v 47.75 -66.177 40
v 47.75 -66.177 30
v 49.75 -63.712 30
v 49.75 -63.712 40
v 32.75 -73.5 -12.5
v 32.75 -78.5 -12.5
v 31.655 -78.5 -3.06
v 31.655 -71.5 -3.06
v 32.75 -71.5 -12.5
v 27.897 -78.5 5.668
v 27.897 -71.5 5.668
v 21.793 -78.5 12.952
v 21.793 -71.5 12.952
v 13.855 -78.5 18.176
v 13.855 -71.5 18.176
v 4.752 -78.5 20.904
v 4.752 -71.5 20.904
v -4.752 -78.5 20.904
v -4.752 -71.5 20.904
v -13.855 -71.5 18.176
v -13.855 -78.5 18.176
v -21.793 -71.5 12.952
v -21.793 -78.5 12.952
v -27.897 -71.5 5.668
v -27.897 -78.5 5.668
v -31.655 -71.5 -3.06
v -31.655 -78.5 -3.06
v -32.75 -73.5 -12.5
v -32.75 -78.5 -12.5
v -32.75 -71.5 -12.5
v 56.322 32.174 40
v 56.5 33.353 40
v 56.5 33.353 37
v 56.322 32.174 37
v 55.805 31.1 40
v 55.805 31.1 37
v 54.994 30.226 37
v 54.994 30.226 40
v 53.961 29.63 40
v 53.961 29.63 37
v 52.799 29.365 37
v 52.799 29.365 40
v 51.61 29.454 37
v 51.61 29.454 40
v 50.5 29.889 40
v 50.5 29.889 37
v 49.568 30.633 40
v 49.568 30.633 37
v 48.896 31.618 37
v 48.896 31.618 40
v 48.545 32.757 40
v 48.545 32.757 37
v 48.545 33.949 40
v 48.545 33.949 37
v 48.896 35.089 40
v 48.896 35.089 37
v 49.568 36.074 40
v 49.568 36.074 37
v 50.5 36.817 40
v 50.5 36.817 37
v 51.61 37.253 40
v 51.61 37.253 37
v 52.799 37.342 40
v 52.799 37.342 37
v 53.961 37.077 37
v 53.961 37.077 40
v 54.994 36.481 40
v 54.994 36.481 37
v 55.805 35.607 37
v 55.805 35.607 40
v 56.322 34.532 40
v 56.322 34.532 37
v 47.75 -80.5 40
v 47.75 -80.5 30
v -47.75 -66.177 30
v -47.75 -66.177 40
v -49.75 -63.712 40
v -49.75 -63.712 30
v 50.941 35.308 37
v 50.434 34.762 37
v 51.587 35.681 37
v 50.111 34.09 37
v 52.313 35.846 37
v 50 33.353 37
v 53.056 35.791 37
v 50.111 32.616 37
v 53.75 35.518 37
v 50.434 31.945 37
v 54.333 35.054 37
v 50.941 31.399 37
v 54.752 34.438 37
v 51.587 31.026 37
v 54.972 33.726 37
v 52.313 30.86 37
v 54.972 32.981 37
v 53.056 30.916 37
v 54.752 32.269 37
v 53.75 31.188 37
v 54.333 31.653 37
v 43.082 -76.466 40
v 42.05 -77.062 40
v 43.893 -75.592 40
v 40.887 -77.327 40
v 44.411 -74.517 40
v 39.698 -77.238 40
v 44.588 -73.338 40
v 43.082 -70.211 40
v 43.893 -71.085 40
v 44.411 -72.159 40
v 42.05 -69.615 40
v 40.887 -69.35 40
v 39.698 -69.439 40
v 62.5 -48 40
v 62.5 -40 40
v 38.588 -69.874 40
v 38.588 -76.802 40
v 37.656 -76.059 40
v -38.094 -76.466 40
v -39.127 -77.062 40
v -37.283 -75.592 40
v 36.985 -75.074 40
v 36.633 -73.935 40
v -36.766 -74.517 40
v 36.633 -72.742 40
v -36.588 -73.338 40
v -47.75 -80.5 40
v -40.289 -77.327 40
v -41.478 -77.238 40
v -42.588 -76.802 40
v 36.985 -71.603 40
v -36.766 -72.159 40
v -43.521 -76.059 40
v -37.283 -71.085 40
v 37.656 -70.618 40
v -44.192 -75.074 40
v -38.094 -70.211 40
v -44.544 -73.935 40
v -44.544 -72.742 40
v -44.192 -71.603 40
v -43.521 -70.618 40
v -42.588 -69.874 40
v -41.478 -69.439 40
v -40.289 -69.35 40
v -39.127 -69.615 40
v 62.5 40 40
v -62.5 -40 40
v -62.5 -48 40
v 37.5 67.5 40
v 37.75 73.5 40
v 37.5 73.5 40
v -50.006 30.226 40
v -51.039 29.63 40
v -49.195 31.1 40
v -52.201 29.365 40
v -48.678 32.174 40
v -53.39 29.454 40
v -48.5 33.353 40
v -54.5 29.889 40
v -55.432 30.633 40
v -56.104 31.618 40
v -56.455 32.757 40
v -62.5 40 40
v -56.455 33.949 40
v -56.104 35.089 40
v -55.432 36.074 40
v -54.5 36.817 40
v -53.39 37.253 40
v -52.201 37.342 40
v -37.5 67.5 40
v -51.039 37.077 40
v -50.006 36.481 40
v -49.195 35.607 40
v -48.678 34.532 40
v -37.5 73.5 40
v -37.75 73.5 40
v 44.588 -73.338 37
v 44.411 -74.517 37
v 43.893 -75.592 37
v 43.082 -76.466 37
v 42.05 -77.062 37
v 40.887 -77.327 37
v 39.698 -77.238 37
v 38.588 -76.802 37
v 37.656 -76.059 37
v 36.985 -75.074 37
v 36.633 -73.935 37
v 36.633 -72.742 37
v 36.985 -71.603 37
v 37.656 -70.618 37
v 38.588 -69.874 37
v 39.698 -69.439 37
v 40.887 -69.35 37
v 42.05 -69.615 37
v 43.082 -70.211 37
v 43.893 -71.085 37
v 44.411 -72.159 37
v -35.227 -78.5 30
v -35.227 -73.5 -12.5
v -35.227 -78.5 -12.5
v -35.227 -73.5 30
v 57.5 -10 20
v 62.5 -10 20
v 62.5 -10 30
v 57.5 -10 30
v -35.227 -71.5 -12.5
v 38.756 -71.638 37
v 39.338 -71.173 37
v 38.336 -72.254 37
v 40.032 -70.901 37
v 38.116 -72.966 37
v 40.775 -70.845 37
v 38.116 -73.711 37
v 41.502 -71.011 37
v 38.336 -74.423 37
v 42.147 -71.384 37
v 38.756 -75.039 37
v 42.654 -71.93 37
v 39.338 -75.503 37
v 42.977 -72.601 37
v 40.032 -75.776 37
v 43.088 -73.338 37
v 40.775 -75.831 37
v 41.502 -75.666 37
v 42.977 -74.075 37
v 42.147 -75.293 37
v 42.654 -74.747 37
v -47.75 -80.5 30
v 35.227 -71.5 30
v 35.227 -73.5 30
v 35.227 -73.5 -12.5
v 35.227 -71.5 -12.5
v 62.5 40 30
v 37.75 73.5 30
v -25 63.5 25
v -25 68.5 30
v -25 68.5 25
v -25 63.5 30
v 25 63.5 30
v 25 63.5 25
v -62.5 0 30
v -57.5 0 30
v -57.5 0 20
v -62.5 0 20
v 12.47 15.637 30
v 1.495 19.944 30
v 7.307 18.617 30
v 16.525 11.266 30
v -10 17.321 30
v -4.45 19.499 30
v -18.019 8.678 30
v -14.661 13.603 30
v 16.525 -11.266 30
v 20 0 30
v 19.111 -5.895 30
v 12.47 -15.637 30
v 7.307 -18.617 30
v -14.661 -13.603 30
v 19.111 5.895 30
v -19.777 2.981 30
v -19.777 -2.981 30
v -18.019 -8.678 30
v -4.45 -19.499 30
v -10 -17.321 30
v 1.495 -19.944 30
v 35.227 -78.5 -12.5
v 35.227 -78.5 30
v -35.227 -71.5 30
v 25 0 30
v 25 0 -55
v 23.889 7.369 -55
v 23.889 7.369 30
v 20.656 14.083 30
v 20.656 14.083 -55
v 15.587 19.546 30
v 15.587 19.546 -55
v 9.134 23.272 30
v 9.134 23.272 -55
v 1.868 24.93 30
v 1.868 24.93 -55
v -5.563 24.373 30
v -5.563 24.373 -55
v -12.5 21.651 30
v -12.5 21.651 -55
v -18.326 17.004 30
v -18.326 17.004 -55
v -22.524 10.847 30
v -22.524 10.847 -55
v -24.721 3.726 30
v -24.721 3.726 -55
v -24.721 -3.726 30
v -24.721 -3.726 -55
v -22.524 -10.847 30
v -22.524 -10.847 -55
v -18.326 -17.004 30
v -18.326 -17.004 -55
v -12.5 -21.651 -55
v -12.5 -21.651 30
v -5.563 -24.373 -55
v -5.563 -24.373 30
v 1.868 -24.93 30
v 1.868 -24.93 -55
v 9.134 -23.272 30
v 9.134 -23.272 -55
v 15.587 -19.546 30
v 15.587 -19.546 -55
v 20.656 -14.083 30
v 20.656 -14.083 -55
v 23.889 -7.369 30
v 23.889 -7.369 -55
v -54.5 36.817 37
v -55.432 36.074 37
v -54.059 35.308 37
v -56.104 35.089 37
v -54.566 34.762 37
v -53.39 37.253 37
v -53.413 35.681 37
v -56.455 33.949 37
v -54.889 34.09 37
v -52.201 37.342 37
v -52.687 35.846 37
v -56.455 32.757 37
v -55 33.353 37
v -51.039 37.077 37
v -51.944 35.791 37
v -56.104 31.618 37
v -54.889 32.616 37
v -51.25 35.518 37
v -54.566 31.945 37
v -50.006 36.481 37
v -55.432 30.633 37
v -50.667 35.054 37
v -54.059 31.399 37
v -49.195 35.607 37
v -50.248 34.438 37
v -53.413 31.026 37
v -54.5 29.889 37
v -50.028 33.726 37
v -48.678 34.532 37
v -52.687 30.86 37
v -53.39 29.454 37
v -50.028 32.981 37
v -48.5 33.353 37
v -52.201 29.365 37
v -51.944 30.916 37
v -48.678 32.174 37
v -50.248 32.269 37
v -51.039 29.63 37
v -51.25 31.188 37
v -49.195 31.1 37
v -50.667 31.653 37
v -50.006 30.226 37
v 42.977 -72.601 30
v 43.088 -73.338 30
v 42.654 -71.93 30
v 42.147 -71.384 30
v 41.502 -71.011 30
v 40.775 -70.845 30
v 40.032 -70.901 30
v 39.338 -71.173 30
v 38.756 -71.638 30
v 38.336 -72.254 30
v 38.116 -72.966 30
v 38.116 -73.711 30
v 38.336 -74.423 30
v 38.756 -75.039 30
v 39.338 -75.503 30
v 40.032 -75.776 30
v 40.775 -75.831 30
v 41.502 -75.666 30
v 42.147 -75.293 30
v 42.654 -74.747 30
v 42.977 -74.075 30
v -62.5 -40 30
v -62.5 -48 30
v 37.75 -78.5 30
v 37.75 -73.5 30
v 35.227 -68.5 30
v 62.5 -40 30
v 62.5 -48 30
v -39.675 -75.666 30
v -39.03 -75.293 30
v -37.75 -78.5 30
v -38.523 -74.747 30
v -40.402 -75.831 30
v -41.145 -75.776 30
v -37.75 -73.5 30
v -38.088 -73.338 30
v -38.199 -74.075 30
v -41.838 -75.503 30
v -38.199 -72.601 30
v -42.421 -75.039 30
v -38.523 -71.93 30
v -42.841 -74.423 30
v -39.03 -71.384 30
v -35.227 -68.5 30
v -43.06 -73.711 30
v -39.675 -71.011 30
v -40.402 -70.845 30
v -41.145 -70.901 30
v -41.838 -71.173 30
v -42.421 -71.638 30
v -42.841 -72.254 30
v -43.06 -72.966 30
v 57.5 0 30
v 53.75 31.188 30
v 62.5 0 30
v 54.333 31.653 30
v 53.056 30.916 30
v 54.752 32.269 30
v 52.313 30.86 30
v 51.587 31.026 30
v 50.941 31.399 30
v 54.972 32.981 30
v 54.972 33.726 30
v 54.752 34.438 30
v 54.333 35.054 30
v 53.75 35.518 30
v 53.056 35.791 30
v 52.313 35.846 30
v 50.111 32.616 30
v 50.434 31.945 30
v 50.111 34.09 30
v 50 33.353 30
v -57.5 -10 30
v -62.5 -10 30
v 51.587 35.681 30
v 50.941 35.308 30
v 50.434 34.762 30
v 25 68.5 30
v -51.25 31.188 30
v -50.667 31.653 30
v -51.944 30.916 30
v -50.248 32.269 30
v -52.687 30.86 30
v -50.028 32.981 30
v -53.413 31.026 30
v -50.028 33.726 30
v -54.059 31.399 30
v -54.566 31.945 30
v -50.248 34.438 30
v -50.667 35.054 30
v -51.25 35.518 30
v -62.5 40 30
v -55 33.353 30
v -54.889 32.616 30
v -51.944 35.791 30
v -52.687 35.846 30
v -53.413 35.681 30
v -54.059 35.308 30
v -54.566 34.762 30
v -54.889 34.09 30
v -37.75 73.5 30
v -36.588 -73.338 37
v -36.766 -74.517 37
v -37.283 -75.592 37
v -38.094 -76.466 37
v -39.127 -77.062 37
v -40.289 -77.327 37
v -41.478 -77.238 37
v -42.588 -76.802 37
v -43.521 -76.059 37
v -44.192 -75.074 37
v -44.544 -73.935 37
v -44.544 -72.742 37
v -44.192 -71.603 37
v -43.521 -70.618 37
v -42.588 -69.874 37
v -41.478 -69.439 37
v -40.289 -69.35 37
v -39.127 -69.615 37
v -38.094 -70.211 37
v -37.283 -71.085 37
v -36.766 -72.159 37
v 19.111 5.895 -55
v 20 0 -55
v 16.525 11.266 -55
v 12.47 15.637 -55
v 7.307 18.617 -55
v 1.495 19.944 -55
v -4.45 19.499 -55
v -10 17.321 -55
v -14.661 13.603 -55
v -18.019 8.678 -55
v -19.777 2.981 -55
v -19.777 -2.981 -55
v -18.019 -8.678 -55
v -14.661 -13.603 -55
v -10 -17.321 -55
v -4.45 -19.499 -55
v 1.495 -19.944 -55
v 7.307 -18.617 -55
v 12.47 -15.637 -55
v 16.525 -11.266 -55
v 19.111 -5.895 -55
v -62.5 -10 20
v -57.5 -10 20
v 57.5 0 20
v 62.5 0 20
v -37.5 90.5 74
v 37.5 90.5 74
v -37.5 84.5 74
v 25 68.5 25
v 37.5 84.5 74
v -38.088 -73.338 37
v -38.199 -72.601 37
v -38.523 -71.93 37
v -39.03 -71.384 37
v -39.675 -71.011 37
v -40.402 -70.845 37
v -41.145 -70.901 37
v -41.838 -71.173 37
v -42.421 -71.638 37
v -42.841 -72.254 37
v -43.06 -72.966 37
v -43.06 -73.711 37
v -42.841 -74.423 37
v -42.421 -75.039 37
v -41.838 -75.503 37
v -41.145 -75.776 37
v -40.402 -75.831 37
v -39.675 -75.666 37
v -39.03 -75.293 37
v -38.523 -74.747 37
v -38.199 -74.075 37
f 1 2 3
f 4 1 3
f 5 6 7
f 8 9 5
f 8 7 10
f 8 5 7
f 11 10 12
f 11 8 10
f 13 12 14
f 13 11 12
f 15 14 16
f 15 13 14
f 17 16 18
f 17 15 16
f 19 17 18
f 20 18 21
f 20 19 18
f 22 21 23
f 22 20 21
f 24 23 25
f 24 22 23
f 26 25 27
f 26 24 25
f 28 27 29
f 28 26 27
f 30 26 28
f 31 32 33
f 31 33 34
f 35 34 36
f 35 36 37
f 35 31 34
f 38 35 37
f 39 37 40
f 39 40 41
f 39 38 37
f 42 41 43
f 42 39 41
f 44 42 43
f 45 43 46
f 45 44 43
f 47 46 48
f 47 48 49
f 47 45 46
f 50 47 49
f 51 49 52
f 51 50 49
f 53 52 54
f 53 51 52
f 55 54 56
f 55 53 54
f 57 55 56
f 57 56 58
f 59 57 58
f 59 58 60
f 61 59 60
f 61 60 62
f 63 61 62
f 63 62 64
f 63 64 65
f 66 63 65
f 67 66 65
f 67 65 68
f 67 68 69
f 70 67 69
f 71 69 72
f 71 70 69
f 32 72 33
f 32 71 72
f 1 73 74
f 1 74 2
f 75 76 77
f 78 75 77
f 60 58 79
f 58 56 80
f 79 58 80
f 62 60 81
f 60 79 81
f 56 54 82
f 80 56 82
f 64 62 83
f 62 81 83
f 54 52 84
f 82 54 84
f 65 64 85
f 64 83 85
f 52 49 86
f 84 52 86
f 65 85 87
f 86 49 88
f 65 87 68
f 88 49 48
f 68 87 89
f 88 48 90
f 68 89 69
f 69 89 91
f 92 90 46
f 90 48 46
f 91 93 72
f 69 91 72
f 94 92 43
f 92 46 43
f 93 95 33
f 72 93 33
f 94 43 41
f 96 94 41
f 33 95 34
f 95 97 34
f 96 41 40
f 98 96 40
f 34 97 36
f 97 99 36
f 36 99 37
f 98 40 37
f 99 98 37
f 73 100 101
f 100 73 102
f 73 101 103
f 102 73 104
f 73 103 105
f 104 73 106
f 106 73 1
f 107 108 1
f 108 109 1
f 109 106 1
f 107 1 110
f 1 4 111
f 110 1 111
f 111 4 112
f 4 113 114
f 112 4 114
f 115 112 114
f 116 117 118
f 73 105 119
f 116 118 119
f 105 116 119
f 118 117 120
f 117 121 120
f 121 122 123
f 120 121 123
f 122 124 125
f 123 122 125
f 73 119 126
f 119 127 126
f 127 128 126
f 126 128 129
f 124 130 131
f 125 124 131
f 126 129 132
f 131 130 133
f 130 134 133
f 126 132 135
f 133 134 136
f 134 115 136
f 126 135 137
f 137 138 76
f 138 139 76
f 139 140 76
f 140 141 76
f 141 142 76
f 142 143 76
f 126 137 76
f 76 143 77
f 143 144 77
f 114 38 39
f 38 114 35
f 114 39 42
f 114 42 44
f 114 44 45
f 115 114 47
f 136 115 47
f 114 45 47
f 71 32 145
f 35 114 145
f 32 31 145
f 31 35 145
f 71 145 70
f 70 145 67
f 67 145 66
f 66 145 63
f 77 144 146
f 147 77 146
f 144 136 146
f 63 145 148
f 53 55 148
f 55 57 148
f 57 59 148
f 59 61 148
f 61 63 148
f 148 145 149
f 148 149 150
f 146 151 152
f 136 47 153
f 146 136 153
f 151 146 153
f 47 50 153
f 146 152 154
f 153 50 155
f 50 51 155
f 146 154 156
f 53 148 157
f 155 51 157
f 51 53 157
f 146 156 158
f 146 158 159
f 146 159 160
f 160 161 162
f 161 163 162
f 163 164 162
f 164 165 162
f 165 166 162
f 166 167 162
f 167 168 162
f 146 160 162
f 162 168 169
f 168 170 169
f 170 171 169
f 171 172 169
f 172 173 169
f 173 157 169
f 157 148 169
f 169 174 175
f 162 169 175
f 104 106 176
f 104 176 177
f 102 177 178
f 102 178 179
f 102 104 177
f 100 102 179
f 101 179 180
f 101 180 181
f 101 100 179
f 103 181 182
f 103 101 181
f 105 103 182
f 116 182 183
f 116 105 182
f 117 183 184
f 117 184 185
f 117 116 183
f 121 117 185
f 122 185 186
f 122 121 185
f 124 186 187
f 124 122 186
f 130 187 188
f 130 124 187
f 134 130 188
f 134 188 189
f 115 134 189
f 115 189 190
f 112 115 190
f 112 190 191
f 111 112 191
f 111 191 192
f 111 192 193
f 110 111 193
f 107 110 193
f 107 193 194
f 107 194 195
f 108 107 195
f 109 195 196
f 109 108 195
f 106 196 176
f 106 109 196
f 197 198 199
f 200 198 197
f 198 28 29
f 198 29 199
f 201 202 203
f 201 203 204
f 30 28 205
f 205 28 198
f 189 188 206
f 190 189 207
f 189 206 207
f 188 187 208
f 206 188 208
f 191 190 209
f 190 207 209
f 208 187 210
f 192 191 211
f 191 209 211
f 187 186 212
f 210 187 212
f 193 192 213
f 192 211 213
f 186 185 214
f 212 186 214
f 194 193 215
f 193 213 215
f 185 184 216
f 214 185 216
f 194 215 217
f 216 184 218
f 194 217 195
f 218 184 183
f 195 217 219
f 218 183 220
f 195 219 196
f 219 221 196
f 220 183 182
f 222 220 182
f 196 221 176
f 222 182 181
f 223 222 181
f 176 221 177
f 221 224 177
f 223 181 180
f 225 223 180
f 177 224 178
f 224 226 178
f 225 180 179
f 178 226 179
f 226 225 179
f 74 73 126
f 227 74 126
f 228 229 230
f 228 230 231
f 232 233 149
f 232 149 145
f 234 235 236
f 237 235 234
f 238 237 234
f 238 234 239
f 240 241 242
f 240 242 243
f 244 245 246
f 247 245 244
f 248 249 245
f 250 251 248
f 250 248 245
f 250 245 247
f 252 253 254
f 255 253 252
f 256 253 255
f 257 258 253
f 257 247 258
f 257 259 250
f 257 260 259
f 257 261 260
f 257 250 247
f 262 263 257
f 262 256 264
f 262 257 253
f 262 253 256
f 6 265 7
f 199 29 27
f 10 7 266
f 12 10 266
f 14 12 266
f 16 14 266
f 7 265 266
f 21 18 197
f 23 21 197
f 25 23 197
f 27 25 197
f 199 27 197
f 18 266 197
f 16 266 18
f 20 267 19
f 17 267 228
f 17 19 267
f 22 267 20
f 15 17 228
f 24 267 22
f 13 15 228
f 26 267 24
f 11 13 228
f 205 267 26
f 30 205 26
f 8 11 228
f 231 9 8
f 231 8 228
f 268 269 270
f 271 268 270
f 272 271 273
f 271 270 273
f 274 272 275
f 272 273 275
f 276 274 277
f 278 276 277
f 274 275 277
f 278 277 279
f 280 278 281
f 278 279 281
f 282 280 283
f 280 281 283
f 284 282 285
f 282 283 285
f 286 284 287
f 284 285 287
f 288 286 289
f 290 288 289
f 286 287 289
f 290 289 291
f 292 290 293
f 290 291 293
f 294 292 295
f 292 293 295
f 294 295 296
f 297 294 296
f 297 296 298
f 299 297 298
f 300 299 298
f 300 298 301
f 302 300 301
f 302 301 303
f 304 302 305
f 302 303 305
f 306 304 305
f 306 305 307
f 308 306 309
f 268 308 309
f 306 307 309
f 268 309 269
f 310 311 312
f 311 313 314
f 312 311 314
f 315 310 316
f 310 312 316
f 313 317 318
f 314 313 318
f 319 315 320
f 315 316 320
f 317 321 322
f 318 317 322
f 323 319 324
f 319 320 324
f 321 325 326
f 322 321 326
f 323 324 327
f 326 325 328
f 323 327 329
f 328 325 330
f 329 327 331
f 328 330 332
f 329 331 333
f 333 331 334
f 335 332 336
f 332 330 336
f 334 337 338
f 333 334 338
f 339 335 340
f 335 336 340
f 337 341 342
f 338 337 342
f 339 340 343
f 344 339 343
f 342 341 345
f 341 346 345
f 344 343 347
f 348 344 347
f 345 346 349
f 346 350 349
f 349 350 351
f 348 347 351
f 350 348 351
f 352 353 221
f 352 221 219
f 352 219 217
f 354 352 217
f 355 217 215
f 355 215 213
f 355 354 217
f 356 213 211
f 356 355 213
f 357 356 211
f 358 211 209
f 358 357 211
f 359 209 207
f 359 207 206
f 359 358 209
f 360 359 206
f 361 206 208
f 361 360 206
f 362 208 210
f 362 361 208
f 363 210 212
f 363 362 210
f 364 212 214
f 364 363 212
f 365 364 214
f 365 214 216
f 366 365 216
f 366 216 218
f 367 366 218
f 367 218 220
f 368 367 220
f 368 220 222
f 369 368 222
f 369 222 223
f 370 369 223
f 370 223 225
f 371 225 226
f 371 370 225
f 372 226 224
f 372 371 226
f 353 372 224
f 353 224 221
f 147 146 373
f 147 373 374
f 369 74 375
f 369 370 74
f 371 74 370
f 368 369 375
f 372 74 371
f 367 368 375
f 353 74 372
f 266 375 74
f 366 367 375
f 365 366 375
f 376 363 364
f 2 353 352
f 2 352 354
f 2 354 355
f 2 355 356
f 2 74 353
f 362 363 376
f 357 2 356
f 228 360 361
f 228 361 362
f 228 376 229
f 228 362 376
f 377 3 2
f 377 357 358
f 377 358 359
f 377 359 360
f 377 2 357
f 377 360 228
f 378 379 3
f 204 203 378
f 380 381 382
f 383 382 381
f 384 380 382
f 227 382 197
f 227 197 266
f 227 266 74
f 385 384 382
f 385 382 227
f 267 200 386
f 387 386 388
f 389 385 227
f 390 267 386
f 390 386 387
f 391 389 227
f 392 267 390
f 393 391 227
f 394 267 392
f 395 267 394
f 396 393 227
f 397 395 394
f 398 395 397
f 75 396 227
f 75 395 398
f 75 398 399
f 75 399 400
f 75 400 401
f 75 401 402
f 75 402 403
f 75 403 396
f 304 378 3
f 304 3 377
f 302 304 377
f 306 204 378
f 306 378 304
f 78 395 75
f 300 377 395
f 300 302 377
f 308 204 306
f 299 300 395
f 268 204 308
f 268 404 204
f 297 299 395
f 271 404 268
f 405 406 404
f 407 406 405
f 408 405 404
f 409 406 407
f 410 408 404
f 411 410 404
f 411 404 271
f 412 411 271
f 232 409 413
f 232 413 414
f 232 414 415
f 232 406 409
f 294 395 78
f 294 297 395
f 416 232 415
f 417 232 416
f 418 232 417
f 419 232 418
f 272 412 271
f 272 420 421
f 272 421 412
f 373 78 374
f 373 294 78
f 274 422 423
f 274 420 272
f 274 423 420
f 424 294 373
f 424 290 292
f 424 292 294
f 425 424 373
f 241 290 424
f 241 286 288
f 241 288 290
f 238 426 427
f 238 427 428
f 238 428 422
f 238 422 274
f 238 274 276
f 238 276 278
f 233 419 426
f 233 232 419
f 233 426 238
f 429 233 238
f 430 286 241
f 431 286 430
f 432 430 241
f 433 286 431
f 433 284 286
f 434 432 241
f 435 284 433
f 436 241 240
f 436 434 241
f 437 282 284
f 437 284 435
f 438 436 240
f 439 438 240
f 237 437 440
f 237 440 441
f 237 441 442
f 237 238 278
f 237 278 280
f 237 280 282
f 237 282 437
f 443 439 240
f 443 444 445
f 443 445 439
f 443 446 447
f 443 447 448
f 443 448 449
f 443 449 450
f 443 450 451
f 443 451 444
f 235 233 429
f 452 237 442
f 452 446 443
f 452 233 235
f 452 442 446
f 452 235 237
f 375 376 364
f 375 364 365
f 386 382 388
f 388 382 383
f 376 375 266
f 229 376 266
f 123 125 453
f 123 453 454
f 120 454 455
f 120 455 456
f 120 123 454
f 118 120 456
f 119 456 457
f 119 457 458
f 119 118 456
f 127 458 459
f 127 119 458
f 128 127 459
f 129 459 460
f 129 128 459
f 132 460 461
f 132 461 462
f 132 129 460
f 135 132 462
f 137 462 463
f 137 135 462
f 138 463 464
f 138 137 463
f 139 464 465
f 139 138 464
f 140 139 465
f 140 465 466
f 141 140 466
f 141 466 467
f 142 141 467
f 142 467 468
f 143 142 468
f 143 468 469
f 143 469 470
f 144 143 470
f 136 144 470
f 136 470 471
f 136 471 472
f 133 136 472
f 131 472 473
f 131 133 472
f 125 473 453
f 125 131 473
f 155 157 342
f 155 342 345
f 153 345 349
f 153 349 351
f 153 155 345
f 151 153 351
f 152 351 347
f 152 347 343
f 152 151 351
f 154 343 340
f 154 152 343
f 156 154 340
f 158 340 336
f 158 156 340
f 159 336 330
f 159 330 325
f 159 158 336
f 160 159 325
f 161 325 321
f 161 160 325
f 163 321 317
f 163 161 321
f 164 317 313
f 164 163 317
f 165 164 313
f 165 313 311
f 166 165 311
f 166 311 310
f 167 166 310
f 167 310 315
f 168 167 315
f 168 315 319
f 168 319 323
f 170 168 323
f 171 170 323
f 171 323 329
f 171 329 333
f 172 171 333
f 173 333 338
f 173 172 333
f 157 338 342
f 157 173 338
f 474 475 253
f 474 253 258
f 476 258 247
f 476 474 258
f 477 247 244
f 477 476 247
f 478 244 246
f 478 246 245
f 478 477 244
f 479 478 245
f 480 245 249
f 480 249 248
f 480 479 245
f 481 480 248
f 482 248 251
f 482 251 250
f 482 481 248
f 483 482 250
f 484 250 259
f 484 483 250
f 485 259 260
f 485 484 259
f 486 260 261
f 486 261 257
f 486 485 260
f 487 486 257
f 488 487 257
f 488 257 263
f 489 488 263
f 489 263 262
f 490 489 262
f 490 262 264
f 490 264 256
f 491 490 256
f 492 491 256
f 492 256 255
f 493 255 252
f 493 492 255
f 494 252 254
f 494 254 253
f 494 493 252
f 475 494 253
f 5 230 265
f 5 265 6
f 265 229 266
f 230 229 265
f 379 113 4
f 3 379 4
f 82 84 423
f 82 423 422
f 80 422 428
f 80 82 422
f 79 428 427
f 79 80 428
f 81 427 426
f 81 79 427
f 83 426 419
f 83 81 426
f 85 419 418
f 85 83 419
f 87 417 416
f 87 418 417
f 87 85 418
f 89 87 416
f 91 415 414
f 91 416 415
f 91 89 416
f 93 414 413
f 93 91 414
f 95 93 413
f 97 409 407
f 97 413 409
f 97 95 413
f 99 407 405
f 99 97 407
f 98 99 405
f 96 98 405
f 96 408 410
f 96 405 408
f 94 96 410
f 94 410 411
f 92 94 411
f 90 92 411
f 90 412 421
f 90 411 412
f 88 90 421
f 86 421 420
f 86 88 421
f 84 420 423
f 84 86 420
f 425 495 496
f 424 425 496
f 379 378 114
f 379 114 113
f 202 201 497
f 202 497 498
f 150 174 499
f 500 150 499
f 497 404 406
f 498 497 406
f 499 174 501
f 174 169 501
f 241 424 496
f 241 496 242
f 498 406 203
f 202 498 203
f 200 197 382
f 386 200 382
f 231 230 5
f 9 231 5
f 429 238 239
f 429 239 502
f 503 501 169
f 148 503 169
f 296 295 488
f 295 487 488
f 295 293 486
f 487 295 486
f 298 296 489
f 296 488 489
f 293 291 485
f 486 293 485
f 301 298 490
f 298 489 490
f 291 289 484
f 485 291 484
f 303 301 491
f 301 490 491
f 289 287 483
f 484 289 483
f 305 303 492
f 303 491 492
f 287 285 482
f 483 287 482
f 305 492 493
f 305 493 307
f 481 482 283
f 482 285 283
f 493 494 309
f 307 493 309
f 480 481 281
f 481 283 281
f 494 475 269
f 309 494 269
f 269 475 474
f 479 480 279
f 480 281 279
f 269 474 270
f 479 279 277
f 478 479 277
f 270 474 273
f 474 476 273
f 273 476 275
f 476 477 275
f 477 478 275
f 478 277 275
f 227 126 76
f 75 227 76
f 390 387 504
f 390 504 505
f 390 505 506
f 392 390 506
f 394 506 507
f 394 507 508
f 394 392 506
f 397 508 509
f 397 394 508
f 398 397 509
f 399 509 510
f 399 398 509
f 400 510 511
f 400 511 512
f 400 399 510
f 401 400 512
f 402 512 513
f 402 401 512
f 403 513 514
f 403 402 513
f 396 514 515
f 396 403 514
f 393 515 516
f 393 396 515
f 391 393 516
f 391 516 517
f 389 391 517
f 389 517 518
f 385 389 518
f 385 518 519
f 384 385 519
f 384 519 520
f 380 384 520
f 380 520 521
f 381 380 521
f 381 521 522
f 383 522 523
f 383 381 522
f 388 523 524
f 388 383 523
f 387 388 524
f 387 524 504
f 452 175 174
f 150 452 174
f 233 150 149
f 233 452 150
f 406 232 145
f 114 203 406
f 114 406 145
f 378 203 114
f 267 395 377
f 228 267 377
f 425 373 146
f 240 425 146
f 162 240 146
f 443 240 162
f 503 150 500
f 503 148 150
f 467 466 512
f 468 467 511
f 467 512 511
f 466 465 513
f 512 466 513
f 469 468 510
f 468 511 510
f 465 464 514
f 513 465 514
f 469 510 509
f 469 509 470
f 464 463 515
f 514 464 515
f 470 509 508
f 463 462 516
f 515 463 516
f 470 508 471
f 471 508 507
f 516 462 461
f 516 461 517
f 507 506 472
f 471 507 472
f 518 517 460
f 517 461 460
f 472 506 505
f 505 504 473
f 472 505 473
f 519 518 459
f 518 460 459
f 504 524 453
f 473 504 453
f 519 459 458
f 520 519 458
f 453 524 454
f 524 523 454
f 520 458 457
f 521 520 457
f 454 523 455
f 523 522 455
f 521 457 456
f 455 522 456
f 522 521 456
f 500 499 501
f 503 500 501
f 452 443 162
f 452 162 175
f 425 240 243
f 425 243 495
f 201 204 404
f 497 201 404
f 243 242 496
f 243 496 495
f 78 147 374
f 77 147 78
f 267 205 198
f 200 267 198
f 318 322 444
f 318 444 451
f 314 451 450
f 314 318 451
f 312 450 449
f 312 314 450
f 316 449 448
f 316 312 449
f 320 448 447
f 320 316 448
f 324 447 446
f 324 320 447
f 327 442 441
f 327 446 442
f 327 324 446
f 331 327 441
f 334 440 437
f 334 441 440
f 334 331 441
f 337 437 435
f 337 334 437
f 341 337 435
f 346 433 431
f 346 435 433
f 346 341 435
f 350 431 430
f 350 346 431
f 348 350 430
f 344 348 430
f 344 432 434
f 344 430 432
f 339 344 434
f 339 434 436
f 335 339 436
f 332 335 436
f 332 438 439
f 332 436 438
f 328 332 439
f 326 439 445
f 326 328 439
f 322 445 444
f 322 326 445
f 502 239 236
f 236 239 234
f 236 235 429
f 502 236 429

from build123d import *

# Parameters (mm, degrees)
ESTRUSIONE_ESTRUSIONE1_DEPTH       = 30
ESTRUSIONE_ESTRUSIONE1_DEPTH_BACK  = 55
SCHIZZO1_R                         = 25
SCHIZZO1_R_2                       = 20
ESTRUSIONE_ESTRUSIONE2_DEPTH       = 10
ESTRUSIONE_ESTRUSIONE3_DEPTH       = 10
ESTRUSIONE_ESTRUSIONE5_DEPTH       = 42.5
TAGLIO_ESTRUSIONE1_DEPTH           = 26.5
SCHIZZO3D5_R                       = 2.5
TAGLIO_ESTRUSIONE2_DEPTH           = 35.5
SCHIZZO3D6_R                       = 4
TAGLIO_ESTRUSIONE3_DEPTH           = 3
ESTRUSIONE_ESTRUSIONE10_DEPTH      = 5
TAGLIO_ESTRUSIONE4_START           = -14
TAGLIO_ESTRUSIONE4_DEPTH           = 14
TAGLIO_ESTRUSIONE7_DEPTH           = 3
ESTRUSIONE_ESTRUSIONE11_START      = 30
ESTRUSIONE_ESTRUSIONE11_OUTLINE_R  = 4
ESTRUSIONE_ESTRUSIONE11_DEPTH      = 10
ESTRUSIONE_ESTRUSIONE12_DEPTH      = 10
ESTRUSIONE_ESTRUSIONE13_DEPTH      = 10
ESTRUSIONE_ESTRUSIONE14_DEPTH      = 10
TAGLIO_ESTRUSIONE11_DEPTH          = 80
SCHIZZO3D17_R                      = 4
TAGLIO_ESTRUSIONE12_DEPTH          = 3
TAGLIO_ESTRUSIONE13_START          = 30
TAGLIO_ESTRUSIONE13_OUTLINE_R      = 2.5
TAGLIO_ESTRUSIONE13_DEPTH          = 7
ESTRUSIONE_ESTRUSIONE15_DEPTH      = 5
ESTRUSIONE_ESTRUSIONE17_DEPTH      = 37.5
ESTRUSIONE_ESTRUSIONE17_DEPTH_BACK = 37.5


# Read off the part's stored shape, not the designer's step: Estrusione-Estrusione11, Taglio-Estrusione13
with BuildPart() as part:
    # Schizzo1 → Estrusione-Estrusione1 (new, two sides: drawn at the far end of the back side and taken through both)
    with BuildSketch(Plane.XY.offset(-ESTRUSIONE_ESTRUSIONE1_DEPTH_BACK)):
        Circle(SCHIZZO1_R)
        Circle(SCHIZZO1_R_2, mode=Mode.SUBTRACT)
    extrude(amount=ESTRUSIONE_ESTRUSIONE1_DEPTH + ESTRUSIONE_ESTRUSIONE1_DEPTH_BACK)

    # Schizzo3D1 → Estrusione-Estrusione2 (add)
    with BuildSketch(Plane(origin=(-37.75, 73.5, 30), x_dir=(0.4568693936855125, -0.889533786381064, 0), z_dir=(0, 0, -1))):
        Polygon((0, 0), (34.493639223, -67.159800872), (75.600538561, -73.870637396), (146.763241471, -37.321085901), (165.255105821, 0), (130.761466598, 67.159800872), (89.654567261, 73.870637396), (18.49186435, 37.321085901), align=None)
    extrude(amount=-ESTRUSIONE_ESTRUSIONE2_DEPTH)

    # Schizzo3D2 → Estrusione-Estrusione3 (add)
    with BuildSketch(Plane(origin=(62.5, 0, 30), x_dir=(-0.9968152785361251, -0.07974522228289001, 0), z_dir=(0, 0, 1))):
        Polygon((0, 0), (0.797452223, 9.968152785), (5.781528616, 9.569426674), (4.984076393, -0.398726111), align=None)
        Polygon((125.39936204, 0), (120.415285647, 0.398726111), (119.617833424, -9.569426674), (124.601909817, -9.968152785), align=None)
    extrude(amount=-ESTRUSIONE_ESTRUSIONE3_DEPTH)

    # Schizzo3D3 → Estrusione-Estrusione5 (add)
    with BuildSketch(Plane(origin=(35.227450684, -68.5, 30), x_dir=(-0.9974912873801348, -0.0707893466612134, 0), z_dir=(0, 0, 1))):
        Polygon((0, 0), (70.278150268, -4.987456437), (70.632097001, 0), (0.353946733, 4.987456437), align=None)
    extrude(amount=-ESTRUSIONE_ESTRUSIONE5_DEPTH)

    # Schizzo3D4 → Taglio-Estrusione1 (cut)
    with BuildSketch(Plane(origin=(32.75, -68.5, -12.5), x_dir=(-1, 0, 0), z_dir=(0, 1, 0))):
        with BuildLine():
            Line((0, 0), (65.5, 0))
            ThreePointArc((65.5, 0), (32.75, 32.75), (0, 0))
        make_face()
    extrude(amount=-TAGLIO_ESTRUSIONE1_DEPTH, mode=Mode.SUBTRACT)

    # Schizzo3D5 → Taglio-Estrusione2 (cut)
    with BuildSketch(Plane(origin=(-52.5, 33.353317087, 40), x_dir=(0.8440673996564301, -0.5362370975951146, 0), z_dir=(0, 0, -1))):
        with Locations(Location((0, 0, 0), (0, 0, 147.572152721))):
            Circle(SCHIZZO3D5_R)
        with Locations(Location((88.627076964, -56.304895247, 0), (0, 0, 147.572152721))):
            Circle(SCHIZZO3D5_R)
        with Locations(Location((124.397648864, 0, 0), (0, 0, 147.572152721))):
            Circle(SCHIZZO3D5_R)
        with Locations(Location((35.7705719, 56.304895247, 0), (0, 0, 147.572152721))):
            Circle(SCHIZZO3D5_R)
    extrude(amount=TAGLIO_ESTRUSIONE2_DEPTH, mode=Mode.SUBTRACT)

    # Schizzo3D6 → Taglio-Estrusione3 (cut)
    with BuildSketch(Plane(origin=(0, 73.5, 40), x_dir=(0, -1, 0), z_dir=(0, 0, -1))):
        with Locations(Location((40.146682913, 52.5, 0), (0, 0, 270))):
            Circle(SCHIZZO3D6_R)
        with Locations(Location((40.146682913, -52.5, 0), (0, 0, 270))):
            Circle(SCHIZZO3D6_R)
        with Locations(Location((106.853317087, -52.5, 0), (0, 0, 270))):
            Circle(SCHIZZO3D6_R)
        with Locations(Location((106.853317087, 52.5, 0), (0, 0, 270))):
            Circle(SCHIZZO3D6_R)
    extrude(amount=TAGLIO_ESTRUSIONE3_DEPTH, mode=Mode.SUBTRACT)

    # Schizzo3D7 → Estrusione-Estrusione10 (add)
    with BuildSketch(Plane(origin=(35.227450684, -73.5, -12.5), x_dir=(-0.8117651174974726, 0, 0.5839840700004706), z_dir=(0, 1, 0))):
        with BuildLine():
            Line((0, 0), (2.011108045, -1.446791734))
            ThreePointArc((2.011108045, -1.446791734), (47.721893936, 6.013037572), (55.181723242, -39.697748319))
            Line((55.181723242, -39.697748319), (57.192831287, -41.144540052))
            Line((57.192831287, -41.144540052), (82.012154262, -6.644522559))
            Line((82.012154262, -6.644522559), (84.059871804, -8.117651175))
            Line((84.059871804, -8.117651175), (89.899712504, 0))
            Line((89.899712504, 0), (28.611446133, 44.090797285))
            Line((28.611446133, 44.090797285), (22.771605433, 35.97314611))
            Line((22.771605433, 35.97314611), (24.819322975, 34.500017494))
            Line((24.819322975, 34.500017494), (0, 0))
        make_face()
    extrude(amount=-ESTRUSIONE_ESTRUSIONE10_DEPTH)

    # Schizzo3D8 → Taglio-Estrusione4 (cut)
    with BuildSketch(Plane(origin=(0, -78.5, 20.25), x_dir=(-0.707106781186551, 0, -0.7071067811865441), z_dir=(0, -1, 0)).offset(TAGLIO_ESTRUSIONE4_START)):
        with BuildLine():
            ThreePointArc((0, 46.315494168), (-0.707106781, -0.707106781), (46.315494168, 0))
            ThreePointArc((46.315494168, 0), (0, 0), (0, 46.315494168))
        make_face()
    extrude(amount=TAGLIO_ESTRUSIONE4_DEPTH, mode=Mode.SUBTRACT)

    # Schizzo3D9 → Taglio-Estrusione7 (cut)
    with BuildSketch(Plane(origin=(35.227450684, -68.5, -12.5), x_dir=(-0.8562730712113632, 0, 0.5165234046180869), z_dir=(0, -1, 0))):
        with BuildLine():
            Line((0, 0), (2.121374306, 1.279661262))
            ThreePointArc((2.121374306, 1.279661262), (13.749394894, 45.407843828), (58.20726047, 35.111944264))
            Line((58.20726047, 35.111944264), (60.328634776, 36.391605526))
            Line((60.328634776, 36.391605526), (82.280879472, 0))
            Line((82.280879472, 0), (21.952244696, -36.391605526))
            Line((21.952244696, -36.391605526), (0, 0))
        make_face()
    extrude(amount=TAGLIO_ESTRUSIONE7_DEPTH, mode=Mode.SUBTRACT)

    # Estrusione-Estrusione11 outline → Estrusione-Estrusione11 (add)
    with BuildSketch(Plane.XY.offset(ESTRUSIONE_ESTRUSIONE11_START)):
        with Locations((52.5, -33.353317087)):
            Circle(ESTRUSIONE_ESTRUSIONE11_OUTLINE_R)
        with Locations((-52.5, -33.353317087)):
            Circle(ESTRUSIONE_ESTRUSIONE11_OUTLINE_R)
    extrude(amount=ESTRUSIONE_ESTRUSIONE11_DEPTH)

    # Schizzo3D11 → Estrusione-Estrusione12 (add)
    with BuildSketch(Plane(origin=(-62.5, -40, 40), x_dir=(0.9979582700578467, -0.06386932928370219, 0), z_dir=(0, 0, -1))):
        Polygon((0, 0), (0.510954634, 7.98366616), (27.158436361, 36.840627497), (26.839089715, 31.850836147), align=None)
        Polygon((102.504285751, 32.018493137), (102.184939104, 27.028701786), (124.744783757, -7.98366616), (125.255738392, 0), align=None)
    extrude(amount=ESTRUSIONE_ESTRUSIONE12_DEPTH)

    # Schizzo3D12 → Estrusione-Estrusione13 (add)
    with BuildSketch(Plane(origin=(-37.75, -78.5, 40), x_dir=(0.9932296706390209, 0.11616721294023631, 0), z_dir=(0, 0, 1))):
        Polygon((0, 0), (-9.932296706, 1.161672129), (-8.770624577, 11.093968836), (1.161672129, 9.932296706), align=None)
        Polygon((74.988840133, -8.770624577), (84.92113684, -9.932296706), (86.082808969, 0), (76.150512263, 1.161672129), align=None)
    extrude(amount=-ESTRUSIONE_ESTRUSIONE13_DEPTH)

    # Schizzo3D15 → Estrusione-Estrusione14 (add)
    with BuildSketch(Plane(origin=(-49.75, -63.712121212, 40), x_dir=(0.9860632358712049, -0.16637095558783233, 0), z_dir=(0, 0, 1))):
        Polygon((0, 0), (4.627662115, -4.074759177), (2.768690441, -4.388409339), (4.432399997, -14.249041698), (98.601439022, 1.639384561), (96.937729467, 11.500016919), (95.078757792, 11.186366757), (98.113291969, 16.553910081), (100.573565494, 1.972126472), (100.906307405, 0), (2.793015436, -16.553910081), (2.460273525, -14.581783609), align=None)
    extrude(amount=-ESTRUSIONE_ESTRUSIONE14_DEPTH)

    # Schizzo3D16 → Taglio-Estrusione11 (cut)
    with BuildSketch(Plane(origin=(-49.75, -80.5, 40), x_dir=(0.9860632358712049, 0.16637095558783233, 0), z_dir=(0, 0, 1))):
        Polygon((0, 0), (1.972126472, -0.332741911), (4.35509632, 13.790870902), (2.793015436, 16.553910081), align=None)
        Polygon((98.113291969, -16.553910081), (96.141165497, -16.22116817), (98.524135346, -2.097555357), (100.906307405, 0), align=None)
    extrude(amount=-TAGLIO_ESTRUSIONE11_DEPTH, mode=Mode.SUBTRACT)

    # Schizzo3D17 → Taglio-Estrusione12 (cut)
    with BuildSketch(Plane(origin=(0, -80.5, 40), x_dir=(-0.9847878761773714, 0.17376086709631217, 0), z_dir=(0, 0, -1))):
        with Locations(Location((41.215356952, 0, 0), (0, 0, 169.993443701))):
            Circle(SCHIZZO3D17_R)
        with Locations(Location((-38.726539684, 14.10534554, 0), (0, 0, 169.993443701))):
            Circle(SCHIZZO3D17_R)
    extrude(amount=TAGLIO_ESTRUSIONE12_DEPTH, mode=Mode.SUBTRACT)

    # Taglio-Estrusione13 outline → Taglio-Estrusione13 (cut)
    with BuildSketch(Plane.XY.offset(TAGLIO_ESTRUSIONE13_START)):
        with Locations((-40.588383838, -73.338383838)):
            Circle(TAGLIO_ESTRUSIONE13_OUTLINE_R)
        with Locations((40.588383838, -73.338383838)):
            Circle(TAGLIO_ESTRUSIONE13_OUTLINE_R)
    extrude(amount=TAGLIO_ESTRUSIONE13_DEPTH, mode=Mode.SUBTRACT)

    # Schizzo3D19 → Estrusione-Estrusione15 (add)
    with BuildSketch(Plane(origin=(0, 68.5, 30), x_dir=(0.9805806756909201, -0.19611613513818418, 0), z_dir=(0, 0, -1))):
        Polygon((0, 0), (-24.514516892, 4.902903378), (-23.533936217, 9.805806757), (25.495097568, 0), (24.514516892, -4.902903378), align=None)
    extrude(amount=ESTRUSIONE_ESTRUSIONE15_DEPTH)

    # Schizzo3D21 → Estrusione-Estrusione17 (add, two sides: drawn at the far end of the back side and taken through both)
    with BuildSketch(Plane(origin=(0, 73.5, 40), x_dir=(0, 0.4472135954999578, 0.8944271909999159), z_dir=(1, 0, 0)).offset(-ESTRUSIONE_ESTRUSIONE17_DEPTH_BACK)):
        Polygon((0, 0), (38.013155617, 0), (35.329874044, 5.366563146), (-2.683281573, 5.366563146), align=None)
    extrude(amount=ESTRUSIONE_ESTRUSIONE17_DEPTH + ESTRUSIONE_ESTRUSIONE17_DEPTH_BACK)


solid = part.part
